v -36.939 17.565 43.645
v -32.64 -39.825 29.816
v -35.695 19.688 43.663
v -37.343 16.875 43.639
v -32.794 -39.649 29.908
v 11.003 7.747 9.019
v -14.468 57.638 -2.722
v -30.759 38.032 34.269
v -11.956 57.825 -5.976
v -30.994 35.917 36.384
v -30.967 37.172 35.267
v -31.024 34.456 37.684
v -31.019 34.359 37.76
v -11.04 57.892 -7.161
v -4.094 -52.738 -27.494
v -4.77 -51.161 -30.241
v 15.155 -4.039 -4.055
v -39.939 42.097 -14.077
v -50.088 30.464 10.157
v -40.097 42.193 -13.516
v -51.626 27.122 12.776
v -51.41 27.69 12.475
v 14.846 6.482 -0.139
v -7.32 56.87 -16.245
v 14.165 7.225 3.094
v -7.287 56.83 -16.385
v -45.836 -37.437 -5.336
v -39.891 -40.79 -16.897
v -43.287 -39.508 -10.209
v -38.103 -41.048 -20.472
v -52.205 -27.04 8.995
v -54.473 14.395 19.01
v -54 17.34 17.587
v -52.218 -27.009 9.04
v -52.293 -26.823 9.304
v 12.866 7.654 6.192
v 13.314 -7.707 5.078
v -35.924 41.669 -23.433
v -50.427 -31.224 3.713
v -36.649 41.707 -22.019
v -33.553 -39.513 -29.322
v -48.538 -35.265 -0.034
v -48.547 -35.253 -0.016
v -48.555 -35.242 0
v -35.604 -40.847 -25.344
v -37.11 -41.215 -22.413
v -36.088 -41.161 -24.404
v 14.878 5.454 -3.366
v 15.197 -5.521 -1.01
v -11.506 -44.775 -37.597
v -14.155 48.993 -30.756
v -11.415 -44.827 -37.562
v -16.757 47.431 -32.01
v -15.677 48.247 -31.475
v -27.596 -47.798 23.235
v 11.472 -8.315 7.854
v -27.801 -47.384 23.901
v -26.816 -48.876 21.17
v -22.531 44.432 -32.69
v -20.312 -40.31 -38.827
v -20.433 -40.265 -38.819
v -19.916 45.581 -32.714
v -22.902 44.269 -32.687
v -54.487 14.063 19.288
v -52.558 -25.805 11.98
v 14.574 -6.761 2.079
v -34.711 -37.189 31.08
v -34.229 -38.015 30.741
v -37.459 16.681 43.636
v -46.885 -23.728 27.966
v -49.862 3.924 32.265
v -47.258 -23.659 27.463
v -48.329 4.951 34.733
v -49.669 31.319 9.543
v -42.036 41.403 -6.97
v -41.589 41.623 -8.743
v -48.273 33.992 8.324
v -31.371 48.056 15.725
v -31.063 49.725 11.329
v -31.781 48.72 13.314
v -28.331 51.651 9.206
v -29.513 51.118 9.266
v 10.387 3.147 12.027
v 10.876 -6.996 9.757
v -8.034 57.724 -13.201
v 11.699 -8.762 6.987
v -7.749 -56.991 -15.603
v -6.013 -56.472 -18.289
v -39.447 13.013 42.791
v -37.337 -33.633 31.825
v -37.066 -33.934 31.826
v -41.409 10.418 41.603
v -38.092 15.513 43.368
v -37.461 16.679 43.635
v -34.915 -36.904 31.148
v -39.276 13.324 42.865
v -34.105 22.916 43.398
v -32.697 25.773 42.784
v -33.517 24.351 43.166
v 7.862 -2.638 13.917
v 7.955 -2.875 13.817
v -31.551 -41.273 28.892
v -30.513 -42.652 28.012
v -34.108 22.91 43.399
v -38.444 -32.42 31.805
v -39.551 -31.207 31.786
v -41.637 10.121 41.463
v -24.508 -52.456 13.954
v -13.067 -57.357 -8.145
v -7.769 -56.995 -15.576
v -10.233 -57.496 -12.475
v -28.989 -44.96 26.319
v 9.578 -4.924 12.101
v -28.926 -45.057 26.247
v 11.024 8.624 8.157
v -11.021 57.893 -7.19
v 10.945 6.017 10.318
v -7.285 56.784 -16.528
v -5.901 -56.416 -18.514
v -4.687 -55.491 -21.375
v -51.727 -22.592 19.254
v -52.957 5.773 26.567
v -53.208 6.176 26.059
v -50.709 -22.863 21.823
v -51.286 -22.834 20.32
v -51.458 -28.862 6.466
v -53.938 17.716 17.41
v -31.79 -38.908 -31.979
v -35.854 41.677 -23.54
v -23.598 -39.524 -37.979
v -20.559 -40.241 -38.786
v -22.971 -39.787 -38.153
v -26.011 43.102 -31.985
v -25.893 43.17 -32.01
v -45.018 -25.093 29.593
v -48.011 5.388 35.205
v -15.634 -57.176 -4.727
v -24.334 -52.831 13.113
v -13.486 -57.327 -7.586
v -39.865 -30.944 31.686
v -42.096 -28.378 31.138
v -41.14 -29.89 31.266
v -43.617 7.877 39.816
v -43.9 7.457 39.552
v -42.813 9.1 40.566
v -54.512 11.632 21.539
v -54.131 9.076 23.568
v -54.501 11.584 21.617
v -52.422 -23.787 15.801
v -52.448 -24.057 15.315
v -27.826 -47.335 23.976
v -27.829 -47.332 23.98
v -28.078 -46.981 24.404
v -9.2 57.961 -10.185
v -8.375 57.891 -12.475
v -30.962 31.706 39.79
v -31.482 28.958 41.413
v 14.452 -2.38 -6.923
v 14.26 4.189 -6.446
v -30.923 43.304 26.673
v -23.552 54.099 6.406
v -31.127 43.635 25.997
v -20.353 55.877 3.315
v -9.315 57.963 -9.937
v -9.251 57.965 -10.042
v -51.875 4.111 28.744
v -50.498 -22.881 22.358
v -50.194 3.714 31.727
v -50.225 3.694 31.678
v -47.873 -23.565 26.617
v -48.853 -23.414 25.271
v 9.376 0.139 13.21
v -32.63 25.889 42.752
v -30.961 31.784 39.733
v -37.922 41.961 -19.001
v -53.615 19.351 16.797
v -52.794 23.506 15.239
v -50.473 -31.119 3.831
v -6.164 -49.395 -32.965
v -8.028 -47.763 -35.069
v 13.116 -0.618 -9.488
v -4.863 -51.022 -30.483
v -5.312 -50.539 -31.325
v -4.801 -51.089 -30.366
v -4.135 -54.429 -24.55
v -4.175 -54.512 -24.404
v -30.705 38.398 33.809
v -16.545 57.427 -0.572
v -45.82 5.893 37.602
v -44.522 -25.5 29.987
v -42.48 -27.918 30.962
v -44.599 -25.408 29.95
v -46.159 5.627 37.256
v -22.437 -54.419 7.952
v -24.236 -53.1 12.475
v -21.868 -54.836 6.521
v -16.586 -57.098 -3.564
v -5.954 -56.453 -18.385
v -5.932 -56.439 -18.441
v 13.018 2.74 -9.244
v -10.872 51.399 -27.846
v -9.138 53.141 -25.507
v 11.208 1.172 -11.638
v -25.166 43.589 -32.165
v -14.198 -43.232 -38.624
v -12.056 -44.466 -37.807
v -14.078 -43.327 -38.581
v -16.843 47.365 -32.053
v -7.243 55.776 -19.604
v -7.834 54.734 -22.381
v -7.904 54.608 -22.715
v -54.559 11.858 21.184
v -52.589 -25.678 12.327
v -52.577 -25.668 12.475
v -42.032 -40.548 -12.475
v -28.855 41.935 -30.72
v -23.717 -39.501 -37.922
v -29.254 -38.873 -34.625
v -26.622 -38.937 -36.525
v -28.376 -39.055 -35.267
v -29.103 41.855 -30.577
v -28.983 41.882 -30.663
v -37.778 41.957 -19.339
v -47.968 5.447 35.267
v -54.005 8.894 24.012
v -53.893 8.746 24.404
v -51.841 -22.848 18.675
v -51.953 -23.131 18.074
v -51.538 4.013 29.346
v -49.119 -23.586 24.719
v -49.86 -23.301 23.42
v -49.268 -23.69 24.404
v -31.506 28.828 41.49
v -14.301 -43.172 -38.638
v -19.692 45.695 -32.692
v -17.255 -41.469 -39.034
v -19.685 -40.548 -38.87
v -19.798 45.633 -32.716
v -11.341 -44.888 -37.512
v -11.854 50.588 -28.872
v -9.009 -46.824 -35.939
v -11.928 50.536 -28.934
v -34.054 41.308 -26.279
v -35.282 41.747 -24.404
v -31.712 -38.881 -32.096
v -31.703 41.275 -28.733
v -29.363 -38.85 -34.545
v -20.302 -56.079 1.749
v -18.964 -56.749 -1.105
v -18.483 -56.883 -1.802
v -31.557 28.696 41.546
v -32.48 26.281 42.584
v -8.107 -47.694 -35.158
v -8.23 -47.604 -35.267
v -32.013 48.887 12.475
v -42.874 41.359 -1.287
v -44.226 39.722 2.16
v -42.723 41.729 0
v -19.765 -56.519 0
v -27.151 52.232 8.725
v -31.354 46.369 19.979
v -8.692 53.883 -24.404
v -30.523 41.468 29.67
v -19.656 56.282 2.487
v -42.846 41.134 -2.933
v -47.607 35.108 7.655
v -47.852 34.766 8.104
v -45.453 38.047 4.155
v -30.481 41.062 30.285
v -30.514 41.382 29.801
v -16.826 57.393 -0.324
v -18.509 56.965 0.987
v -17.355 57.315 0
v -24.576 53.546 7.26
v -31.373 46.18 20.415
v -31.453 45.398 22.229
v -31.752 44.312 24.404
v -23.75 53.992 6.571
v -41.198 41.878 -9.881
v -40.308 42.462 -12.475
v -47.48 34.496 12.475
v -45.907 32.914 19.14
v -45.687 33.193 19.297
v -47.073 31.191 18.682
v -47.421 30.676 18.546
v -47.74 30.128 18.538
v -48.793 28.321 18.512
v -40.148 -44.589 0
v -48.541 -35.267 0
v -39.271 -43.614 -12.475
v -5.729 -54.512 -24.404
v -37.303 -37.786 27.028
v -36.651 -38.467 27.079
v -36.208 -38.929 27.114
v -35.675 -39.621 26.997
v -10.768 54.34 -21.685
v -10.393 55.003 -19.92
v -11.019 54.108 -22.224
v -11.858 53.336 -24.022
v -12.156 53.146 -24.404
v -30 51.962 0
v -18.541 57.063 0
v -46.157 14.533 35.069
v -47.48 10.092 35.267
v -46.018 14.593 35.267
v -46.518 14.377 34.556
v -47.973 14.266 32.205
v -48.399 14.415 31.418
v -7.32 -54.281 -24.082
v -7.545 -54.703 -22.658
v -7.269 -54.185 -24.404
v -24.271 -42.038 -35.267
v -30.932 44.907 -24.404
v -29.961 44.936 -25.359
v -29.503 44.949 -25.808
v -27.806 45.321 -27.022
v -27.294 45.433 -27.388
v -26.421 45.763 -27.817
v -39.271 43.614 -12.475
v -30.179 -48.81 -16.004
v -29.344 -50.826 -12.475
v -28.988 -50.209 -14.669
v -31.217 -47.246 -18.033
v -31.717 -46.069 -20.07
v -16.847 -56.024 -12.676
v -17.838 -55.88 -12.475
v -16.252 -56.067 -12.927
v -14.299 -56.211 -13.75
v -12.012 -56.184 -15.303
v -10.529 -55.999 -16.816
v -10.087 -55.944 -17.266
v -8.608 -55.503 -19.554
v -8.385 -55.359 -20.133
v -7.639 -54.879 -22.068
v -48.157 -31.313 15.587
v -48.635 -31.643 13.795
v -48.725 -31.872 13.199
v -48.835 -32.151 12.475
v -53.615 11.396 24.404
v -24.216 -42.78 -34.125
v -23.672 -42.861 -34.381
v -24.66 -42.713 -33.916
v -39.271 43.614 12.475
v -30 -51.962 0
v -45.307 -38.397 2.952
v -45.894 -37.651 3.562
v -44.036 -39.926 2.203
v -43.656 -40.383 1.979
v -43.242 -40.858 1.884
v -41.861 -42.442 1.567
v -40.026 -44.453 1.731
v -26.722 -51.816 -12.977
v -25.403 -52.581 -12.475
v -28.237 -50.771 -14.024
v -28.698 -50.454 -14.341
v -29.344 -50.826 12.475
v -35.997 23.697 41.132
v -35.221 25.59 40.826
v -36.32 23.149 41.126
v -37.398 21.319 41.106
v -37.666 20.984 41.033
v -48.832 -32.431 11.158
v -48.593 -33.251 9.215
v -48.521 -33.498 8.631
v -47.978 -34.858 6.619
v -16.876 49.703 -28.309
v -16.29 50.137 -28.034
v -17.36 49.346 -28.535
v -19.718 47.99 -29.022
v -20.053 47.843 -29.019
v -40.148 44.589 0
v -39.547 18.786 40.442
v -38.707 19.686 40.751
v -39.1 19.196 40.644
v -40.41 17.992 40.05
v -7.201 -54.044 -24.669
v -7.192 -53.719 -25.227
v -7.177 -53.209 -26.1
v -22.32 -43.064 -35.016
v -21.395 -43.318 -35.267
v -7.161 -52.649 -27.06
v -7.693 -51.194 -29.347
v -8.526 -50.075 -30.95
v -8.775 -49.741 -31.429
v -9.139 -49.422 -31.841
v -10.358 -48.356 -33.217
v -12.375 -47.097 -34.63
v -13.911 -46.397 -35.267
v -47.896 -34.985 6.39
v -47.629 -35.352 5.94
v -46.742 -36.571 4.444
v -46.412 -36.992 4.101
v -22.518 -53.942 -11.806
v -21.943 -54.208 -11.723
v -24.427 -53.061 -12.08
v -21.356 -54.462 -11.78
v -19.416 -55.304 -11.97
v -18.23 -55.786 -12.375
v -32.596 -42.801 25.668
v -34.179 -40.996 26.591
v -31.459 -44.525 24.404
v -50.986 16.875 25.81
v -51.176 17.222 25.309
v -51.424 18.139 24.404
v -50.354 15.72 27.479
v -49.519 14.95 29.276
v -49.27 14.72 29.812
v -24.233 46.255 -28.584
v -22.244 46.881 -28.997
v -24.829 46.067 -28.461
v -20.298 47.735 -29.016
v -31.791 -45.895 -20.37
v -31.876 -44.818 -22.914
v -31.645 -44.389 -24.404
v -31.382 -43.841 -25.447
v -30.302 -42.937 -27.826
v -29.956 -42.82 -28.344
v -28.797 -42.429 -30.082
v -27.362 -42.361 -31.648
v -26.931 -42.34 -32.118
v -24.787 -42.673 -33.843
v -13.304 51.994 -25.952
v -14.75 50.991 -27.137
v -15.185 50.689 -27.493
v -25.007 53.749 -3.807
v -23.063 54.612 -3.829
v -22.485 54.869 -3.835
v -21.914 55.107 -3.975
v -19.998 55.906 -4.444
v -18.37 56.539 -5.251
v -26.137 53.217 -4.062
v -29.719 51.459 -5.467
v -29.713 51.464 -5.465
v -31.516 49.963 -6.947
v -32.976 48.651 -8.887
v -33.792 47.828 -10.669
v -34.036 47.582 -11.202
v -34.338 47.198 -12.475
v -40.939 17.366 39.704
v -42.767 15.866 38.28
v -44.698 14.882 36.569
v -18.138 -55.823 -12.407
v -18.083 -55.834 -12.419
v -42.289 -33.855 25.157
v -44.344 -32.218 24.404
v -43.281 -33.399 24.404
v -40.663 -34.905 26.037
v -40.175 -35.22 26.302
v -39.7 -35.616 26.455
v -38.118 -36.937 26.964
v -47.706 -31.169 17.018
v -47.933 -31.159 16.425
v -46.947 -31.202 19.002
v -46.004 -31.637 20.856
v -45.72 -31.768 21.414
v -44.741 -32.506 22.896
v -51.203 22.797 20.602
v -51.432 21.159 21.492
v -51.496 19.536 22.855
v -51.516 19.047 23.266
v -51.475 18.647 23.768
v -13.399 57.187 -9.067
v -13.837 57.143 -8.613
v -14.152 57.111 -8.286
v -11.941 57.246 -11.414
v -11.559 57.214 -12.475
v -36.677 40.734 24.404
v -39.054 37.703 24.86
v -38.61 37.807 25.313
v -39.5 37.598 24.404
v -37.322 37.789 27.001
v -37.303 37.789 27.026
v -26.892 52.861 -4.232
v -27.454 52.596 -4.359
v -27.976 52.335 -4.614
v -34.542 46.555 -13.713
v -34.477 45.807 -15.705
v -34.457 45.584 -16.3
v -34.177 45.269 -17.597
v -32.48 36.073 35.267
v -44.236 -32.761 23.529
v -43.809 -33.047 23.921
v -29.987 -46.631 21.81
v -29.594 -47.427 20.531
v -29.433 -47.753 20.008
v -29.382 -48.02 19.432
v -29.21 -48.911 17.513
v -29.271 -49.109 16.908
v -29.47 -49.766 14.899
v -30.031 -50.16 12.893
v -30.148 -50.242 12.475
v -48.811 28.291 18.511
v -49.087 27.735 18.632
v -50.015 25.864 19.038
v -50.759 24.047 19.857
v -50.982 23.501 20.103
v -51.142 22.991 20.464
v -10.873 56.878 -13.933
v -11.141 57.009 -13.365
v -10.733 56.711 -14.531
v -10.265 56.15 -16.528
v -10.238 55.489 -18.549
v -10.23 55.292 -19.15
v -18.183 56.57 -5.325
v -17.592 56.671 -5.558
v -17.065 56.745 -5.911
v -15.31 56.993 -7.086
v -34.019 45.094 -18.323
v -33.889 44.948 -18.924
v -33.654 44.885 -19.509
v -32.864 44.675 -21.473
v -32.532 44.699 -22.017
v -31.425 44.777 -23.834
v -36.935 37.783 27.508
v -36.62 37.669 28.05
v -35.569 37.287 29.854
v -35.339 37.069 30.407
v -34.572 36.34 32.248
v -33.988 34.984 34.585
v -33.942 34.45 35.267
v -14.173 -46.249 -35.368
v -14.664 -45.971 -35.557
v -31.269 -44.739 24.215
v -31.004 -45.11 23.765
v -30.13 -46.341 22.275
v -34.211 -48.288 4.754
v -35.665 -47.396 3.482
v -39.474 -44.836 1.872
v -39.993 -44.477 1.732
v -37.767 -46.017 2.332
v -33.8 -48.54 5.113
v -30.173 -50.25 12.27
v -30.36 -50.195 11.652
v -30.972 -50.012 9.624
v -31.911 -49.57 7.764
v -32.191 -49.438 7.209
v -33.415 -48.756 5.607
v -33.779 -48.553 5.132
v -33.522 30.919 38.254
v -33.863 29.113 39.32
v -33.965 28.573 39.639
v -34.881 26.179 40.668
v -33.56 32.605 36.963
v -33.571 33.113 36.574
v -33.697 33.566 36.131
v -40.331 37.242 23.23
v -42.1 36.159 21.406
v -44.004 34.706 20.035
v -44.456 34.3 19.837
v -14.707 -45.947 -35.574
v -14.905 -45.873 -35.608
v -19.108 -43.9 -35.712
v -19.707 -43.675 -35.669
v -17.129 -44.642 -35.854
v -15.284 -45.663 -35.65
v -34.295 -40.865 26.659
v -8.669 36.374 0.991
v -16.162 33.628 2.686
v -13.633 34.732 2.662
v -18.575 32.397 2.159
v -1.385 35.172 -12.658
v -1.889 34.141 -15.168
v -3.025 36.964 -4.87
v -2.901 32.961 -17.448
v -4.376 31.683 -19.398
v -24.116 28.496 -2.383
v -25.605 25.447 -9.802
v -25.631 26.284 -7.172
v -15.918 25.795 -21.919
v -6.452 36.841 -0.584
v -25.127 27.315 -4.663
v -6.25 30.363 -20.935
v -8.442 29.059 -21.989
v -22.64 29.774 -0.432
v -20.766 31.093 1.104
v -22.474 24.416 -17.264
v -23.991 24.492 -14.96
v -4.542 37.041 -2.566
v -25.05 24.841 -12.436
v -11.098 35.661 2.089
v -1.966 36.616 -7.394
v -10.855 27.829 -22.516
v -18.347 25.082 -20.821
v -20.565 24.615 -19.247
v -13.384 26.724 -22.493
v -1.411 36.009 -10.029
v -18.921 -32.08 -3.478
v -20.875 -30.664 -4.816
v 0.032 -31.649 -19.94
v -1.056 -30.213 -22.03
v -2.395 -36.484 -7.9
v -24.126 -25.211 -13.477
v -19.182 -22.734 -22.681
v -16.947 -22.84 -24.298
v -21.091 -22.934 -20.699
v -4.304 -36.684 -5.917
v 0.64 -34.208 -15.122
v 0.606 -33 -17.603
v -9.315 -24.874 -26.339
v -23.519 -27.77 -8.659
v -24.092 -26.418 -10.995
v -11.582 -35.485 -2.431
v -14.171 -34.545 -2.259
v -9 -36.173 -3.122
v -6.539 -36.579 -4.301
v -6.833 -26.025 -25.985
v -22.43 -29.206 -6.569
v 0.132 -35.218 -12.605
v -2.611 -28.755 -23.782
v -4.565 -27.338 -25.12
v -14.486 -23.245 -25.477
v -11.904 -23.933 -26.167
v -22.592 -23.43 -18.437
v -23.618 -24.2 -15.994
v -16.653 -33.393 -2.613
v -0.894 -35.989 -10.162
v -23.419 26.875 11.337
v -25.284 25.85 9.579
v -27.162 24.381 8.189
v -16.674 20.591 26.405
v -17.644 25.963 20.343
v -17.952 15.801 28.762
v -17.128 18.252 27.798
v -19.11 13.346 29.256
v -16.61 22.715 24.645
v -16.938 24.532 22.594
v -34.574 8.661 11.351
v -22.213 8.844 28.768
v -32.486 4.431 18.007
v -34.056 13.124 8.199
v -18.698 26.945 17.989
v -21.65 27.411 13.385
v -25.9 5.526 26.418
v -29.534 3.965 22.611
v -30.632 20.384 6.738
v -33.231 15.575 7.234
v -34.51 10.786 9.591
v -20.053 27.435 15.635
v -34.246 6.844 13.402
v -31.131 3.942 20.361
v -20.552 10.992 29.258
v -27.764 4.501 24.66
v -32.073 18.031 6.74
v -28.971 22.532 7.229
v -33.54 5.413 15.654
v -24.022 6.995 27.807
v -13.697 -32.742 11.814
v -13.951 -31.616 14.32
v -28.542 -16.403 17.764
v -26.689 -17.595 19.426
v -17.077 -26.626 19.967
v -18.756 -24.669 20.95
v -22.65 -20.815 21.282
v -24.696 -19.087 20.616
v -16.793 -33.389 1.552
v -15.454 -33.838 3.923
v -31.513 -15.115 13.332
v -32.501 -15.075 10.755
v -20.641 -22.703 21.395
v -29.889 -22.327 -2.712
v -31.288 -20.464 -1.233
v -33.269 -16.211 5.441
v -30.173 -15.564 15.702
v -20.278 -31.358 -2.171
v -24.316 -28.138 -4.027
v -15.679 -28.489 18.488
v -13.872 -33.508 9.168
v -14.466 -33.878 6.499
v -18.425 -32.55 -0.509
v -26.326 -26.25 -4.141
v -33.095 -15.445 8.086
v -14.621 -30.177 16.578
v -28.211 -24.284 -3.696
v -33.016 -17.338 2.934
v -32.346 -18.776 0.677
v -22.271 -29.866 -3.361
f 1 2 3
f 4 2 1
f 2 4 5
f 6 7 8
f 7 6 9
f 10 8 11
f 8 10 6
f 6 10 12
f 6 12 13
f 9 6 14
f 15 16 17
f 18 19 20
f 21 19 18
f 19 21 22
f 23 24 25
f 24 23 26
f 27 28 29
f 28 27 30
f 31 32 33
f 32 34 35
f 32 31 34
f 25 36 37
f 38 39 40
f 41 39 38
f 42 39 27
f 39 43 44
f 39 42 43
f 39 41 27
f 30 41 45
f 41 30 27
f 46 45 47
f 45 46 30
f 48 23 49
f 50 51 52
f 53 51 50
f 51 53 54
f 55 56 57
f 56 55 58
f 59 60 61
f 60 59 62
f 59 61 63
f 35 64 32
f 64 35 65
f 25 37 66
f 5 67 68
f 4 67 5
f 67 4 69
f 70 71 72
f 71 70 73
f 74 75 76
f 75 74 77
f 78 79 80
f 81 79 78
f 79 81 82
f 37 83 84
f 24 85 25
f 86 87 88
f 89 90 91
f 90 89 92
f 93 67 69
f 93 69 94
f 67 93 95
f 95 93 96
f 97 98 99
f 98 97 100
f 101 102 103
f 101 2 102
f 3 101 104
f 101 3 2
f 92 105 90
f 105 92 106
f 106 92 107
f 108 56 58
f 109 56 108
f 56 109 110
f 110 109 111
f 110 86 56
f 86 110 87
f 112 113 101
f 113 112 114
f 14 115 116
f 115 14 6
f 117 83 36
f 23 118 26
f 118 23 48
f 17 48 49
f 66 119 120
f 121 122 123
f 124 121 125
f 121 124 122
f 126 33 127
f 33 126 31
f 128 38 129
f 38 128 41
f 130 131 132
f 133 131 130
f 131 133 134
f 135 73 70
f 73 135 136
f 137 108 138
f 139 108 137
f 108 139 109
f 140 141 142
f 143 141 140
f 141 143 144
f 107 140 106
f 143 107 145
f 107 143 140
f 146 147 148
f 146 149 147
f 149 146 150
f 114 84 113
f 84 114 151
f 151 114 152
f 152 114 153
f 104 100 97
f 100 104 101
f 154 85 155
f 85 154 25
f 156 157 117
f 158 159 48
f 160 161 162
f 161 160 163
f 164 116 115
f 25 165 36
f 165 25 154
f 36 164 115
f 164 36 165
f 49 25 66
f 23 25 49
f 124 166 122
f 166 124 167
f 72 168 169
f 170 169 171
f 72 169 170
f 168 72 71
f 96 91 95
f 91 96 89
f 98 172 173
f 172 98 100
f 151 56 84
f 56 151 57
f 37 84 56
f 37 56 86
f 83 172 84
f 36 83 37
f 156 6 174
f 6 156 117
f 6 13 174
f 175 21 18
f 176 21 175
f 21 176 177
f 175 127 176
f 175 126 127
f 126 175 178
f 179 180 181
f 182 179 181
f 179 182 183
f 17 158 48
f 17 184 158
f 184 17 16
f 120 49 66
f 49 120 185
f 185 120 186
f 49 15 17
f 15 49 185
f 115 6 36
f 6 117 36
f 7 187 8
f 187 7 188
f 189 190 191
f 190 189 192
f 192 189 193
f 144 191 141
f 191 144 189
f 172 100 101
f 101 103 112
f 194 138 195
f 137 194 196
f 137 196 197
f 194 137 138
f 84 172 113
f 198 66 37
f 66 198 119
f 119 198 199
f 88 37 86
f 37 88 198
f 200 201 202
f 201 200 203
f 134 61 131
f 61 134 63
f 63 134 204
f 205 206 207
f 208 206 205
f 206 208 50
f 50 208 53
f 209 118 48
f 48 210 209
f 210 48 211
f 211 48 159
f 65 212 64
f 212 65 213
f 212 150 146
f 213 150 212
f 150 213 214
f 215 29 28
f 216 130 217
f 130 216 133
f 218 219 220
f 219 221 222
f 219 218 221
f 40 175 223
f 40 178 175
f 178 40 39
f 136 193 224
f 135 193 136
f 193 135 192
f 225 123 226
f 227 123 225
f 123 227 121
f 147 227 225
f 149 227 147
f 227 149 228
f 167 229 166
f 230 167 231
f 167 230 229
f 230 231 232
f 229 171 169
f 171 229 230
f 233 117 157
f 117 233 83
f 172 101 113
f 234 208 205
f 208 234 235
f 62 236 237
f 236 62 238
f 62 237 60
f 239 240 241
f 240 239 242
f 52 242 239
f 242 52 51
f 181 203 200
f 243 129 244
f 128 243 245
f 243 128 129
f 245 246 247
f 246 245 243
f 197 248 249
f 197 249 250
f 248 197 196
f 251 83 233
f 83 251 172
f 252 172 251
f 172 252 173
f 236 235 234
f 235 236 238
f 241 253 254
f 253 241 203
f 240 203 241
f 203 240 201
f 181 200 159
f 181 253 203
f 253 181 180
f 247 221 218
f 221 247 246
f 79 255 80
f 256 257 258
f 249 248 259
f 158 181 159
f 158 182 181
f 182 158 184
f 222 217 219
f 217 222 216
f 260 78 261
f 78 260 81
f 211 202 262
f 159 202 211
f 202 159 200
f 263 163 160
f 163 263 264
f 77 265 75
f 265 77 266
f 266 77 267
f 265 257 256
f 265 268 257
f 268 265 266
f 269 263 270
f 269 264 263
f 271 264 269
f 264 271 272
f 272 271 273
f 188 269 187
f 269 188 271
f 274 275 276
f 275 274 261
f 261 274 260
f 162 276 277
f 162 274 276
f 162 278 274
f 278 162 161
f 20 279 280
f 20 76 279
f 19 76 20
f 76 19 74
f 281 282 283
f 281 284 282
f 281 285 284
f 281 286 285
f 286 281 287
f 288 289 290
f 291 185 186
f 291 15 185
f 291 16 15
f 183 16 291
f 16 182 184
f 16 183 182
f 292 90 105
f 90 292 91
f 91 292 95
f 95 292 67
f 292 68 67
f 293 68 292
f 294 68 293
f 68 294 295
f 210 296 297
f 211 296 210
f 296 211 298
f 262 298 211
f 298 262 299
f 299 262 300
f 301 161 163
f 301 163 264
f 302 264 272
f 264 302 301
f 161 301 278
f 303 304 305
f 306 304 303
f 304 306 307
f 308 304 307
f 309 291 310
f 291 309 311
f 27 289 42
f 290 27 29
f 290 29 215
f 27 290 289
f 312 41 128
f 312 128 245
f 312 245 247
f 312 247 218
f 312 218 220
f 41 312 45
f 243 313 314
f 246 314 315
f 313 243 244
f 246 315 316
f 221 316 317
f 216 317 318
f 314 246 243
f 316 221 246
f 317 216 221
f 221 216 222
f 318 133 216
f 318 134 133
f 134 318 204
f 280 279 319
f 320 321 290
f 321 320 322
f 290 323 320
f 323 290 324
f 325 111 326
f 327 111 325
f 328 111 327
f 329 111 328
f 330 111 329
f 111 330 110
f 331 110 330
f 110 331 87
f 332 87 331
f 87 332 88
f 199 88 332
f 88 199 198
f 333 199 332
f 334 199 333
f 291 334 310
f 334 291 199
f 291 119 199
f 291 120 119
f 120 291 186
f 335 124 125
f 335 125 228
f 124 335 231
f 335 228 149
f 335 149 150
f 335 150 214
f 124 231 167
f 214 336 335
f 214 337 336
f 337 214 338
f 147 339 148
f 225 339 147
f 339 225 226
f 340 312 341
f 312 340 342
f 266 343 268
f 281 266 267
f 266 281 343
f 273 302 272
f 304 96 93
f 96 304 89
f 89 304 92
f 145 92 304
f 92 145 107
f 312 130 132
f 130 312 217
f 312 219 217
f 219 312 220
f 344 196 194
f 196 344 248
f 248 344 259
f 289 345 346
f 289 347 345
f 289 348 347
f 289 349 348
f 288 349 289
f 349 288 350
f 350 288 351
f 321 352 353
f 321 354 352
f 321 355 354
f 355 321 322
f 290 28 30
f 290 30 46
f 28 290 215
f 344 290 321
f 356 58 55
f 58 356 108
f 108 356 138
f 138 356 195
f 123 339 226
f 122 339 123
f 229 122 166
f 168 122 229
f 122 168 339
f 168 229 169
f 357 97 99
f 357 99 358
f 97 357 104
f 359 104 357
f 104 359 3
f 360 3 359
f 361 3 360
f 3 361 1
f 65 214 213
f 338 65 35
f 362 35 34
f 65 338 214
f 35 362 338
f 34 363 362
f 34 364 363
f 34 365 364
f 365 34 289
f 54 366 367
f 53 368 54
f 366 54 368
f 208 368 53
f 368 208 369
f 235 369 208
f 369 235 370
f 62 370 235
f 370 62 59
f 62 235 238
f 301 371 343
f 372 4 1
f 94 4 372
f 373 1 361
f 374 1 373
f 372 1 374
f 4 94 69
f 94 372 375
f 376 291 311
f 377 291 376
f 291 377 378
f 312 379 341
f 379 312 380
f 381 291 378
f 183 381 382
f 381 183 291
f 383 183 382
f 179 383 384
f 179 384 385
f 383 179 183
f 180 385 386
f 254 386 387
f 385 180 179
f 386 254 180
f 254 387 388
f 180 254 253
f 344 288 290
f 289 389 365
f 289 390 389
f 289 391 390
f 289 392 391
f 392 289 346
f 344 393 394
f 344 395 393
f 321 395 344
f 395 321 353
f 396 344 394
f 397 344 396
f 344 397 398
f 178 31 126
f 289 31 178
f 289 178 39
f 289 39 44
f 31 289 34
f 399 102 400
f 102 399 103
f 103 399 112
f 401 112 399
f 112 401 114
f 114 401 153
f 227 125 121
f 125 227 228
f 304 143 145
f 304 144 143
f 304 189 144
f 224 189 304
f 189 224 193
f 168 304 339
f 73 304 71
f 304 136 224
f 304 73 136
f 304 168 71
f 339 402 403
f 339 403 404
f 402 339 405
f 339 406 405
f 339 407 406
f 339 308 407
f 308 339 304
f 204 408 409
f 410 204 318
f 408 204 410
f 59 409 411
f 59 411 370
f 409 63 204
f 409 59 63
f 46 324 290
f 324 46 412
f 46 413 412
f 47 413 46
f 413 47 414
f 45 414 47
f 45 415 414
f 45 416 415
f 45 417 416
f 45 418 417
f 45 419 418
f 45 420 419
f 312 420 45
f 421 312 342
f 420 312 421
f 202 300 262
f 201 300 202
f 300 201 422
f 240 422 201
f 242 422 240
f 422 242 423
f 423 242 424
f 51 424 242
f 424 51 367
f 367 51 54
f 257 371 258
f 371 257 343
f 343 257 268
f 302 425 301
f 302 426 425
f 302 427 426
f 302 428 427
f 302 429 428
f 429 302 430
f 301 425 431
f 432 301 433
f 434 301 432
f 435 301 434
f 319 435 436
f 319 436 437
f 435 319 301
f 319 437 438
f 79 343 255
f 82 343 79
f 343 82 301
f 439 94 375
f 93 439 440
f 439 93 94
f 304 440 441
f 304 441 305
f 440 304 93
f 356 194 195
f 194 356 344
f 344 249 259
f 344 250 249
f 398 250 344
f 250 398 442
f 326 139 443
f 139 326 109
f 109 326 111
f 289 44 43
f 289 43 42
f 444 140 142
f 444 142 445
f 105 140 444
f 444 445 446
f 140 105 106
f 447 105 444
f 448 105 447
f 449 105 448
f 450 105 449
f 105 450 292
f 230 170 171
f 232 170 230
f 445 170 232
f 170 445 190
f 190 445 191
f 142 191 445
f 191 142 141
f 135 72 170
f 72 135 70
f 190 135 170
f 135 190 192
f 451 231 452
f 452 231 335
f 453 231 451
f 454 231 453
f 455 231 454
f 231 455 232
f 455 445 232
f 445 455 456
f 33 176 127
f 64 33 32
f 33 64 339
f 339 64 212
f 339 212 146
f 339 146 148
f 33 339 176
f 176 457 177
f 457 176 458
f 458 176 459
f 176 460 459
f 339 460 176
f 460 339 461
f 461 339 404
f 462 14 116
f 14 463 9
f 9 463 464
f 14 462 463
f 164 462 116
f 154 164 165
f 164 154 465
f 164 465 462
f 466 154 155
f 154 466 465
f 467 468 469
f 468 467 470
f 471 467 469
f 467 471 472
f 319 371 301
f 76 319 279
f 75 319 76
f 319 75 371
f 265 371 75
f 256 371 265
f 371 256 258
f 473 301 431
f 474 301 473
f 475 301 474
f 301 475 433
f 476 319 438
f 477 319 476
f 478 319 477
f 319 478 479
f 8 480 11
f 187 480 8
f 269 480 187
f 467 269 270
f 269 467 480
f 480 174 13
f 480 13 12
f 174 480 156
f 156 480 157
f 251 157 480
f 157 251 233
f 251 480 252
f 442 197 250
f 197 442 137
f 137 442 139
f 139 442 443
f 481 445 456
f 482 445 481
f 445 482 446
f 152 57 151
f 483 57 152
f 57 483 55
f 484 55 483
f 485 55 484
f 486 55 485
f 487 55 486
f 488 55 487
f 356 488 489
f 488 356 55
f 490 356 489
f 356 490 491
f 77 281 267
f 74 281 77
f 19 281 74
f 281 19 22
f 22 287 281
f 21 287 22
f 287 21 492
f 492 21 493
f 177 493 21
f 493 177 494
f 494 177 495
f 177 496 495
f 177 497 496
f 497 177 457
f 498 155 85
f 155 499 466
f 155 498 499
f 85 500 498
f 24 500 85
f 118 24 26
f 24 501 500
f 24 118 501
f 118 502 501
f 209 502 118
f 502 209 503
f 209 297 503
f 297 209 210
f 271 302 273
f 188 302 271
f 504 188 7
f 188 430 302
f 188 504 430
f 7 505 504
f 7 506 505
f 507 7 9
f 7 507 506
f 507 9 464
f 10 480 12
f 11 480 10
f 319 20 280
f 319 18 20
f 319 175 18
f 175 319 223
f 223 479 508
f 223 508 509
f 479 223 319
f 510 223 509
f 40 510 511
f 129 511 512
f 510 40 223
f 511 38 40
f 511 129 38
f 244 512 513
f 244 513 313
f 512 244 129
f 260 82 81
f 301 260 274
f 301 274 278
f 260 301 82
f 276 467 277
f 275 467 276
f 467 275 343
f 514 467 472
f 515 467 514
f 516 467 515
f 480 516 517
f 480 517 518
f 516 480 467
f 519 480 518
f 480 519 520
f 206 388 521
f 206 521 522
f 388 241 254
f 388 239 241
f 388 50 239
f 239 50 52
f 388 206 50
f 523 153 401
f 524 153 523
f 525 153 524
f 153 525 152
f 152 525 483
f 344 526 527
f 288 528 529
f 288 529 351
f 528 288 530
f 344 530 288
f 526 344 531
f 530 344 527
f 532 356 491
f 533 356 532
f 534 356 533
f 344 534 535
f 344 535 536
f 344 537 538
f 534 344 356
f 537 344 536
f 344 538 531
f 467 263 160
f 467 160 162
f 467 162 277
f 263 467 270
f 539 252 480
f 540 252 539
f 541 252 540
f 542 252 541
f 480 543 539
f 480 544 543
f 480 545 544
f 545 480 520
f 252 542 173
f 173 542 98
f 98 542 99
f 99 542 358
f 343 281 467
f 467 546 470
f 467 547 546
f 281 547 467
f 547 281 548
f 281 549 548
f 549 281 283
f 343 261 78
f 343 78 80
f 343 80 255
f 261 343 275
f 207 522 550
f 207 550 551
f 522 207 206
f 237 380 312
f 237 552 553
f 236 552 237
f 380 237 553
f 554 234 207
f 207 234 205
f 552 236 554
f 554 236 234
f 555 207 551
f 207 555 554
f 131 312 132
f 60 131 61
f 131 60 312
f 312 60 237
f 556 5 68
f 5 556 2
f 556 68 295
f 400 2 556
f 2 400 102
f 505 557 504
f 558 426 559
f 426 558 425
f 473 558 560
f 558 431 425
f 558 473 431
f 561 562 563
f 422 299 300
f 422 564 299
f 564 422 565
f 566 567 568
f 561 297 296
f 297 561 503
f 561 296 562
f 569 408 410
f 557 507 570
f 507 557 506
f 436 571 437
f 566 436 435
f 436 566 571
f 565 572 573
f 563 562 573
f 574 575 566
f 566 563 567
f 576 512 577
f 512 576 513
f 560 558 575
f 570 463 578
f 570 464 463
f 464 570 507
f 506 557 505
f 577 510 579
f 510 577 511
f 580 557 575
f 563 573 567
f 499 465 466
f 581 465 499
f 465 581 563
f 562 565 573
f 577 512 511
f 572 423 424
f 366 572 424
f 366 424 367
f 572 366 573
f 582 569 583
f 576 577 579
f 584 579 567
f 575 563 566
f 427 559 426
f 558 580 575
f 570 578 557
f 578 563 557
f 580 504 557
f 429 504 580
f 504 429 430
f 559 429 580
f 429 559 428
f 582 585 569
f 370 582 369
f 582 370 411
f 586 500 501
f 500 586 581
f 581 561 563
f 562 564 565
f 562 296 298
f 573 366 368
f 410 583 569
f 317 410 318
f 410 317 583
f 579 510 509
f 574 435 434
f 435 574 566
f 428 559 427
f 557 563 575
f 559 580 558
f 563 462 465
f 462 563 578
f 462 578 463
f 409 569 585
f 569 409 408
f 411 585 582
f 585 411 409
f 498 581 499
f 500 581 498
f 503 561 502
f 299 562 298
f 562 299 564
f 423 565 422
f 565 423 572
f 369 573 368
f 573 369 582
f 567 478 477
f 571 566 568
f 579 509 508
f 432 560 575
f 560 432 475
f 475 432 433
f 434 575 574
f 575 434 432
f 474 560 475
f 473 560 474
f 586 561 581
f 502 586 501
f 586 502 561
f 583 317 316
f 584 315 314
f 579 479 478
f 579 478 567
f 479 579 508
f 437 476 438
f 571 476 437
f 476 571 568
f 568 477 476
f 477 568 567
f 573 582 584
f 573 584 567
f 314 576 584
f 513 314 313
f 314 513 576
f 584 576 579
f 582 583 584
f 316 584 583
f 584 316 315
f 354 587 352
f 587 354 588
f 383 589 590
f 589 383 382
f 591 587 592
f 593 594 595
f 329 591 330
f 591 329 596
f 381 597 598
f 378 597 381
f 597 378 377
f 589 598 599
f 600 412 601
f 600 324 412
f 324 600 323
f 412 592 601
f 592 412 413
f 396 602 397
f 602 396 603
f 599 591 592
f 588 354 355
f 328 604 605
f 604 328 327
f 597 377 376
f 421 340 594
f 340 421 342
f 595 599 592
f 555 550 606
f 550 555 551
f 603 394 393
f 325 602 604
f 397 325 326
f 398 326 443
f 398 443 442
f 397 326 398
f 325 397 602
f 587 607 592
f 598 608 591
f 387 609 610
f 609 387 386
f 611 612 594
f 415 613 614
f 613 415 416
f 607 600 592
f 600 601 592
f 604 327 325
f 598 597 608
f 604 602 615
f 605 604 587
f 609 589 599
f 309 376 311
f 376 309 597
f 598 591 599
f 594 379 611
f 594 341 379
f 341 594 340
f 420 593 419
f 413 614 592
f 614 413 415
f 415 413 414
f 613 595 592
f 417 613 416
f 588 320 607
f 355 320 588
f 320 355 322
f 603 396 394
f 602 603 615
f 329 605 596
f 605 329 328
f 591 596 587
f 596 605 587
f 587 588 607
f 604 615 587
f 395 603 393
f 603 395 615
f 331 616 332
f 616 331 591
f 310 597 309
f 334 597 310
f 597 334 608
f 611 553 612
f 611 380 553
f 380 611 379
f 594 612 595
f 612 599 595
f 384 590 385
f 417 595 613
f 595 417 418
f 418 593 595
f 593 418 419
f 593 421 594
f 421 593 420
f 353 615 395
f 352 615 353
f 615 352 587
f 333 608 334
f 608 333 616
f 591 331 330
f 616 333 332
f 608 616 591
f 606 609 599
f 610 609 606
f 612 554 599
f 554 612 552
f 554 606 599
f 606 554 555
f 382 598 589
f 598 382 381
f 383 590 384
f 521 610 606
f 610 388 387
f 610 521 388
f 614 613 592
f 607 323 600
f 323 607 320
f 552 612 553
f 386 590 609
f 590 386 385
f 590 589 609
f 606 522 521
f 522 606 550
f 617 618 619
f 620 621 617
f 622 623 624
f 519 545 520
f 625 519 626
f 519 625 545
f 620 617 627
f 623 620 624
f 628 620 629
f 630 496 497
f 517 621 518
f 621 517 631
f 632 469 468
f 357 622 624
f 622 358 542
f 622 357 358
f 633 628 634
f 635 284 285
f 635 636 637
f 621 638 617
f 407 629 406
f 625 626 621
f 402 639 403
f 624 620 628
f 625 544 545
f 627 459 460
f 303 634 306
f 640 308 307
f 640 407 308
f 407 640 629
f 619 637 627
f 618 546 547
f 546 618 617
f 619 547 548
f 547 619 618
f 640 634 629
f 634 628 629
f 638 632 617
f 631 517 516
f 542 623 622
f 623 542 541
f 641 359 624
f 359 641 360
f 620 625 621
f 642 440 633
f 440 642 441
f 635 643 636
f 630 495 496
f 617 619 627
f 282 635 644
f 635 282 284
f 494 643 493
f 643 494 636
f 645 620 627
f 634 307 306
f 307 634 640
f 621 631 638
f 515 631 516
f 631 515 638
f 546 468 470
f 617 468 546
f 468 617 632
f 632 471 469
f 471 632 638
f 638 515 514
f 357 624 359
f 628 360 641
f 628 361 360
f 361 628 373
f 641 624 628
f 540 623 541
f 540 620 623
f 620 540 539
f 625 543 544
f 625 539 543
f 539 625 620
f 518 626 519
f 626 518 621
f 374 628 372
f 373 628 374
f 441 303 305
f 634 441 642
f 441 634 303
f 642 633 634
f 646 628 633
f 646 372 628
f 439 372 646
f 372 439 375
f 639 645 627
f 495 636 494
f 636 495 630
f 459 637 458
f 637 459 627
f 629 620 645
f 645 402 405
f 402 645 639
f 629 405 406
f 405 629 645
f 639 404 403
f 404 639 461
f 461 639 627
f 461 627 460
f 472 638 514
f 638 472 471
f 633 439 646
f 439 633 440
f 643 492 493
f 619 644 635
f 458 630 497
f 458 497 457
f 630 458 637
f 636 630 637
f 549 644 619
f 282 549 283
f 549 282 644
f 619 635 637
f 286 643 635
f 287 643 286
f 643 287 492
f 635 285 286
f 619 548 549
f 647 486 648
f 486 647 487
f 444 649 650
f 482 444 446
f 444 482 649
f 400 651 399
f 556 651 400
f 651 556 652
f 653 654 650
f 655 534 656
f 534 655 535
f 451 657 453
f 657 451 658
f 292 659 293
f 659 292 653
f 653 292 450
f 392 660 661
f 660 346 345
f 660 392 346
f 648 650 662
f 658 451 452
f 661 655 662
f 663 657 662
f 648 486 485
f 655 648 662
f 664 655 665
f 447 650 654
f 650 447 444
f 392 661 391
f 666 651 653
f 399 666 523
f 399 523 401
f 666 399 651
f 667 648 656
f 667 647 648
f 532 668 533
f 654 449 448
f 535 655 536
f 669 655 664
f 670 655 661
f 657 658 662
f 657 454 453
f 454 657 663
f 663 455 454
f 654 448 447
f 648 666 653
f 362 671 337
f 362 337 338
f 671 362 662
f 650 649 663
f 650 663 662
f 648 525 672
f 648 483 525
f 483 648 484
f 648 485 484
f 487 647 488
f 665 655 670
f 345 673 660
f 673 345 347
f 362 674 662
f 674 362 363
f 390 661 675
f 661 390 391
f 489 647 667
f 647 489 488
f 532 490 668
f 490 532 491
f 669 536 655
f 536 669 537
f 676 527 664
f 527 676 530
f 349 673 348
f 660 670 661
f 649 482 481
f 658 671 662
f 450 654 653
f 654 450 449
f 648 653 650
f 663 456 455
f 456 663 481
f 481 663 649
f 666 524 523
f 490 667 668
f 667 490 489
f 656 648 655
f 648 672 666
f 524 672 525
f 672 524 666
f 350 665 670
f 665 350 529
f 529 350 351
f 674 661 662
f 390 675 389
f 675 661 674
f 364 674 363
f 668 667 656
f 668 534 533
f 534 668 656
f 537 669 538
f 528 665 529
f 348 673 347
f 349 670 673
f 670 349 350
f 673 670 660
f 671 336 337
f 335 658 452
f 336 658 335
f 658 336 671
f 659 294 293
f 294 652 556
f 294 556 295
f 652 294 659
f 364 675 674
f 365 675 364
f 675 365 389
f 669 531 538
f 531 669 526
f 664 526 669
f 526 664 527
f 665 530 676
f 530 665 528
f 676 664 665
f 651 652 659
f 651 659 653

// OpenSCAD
difference() {
	intersection() {
		hull() {
			rotate(a = -44.0760747966, v = [-0.0723183475, 0.6918434180, 0.0000000000]) {
				rotate(a = -90.0000000000, v = [0.8660254038, 0.5000000000, -0.0000000000]) {
					cylinder(h = 60, r = 16.2000000000);
				}
			}
			rotate(a = -44.0760747966, v = [-0.0723183475, 0.6918434180, 0.0000000000]) {
				rotate(a = -90.0000000000, v = [-0.8660254038, 0.5000000000, 0.0000000000]) {
					cylinder(h = 60, r = 16.2000000000);
				}
			}
			rotate(a = -44.0760747966, v = [-0.0723183475, 0.6918434180, 0.0000000000]) {
				rotate(a = -32.5529951665, v = [0.5053465272, 0.1848090856, -0.0000000000]) {
					cylinder(h = 60, r = 16.2000000000);
				}
			}
			rotate(a = -44.0760747966, v = [-0.0723183475, 0.6918434180, 0.0000000000]) {
				rotate(a = -46.2229214243, v = [-0.6598396710, 0.2931708240, 0.0000000000]) {
					cylinder(h = 60, r = 16.2000000000);
				}
			}
		}
		sphere(r = 60);
	}
	union() {
		rotate(a = -44.0760747966, v = [-0.0723183475, 0.6918434180, 0.0000000000]) {
			rotate(a = -90.0000000000, v = [0.8660254038, 0.5000000000, -0.0000000000]) {
				translate(v = [0, 0, 35]) {
					cylinder(h = 100, r = 13.2000000000);
				}
			}
		}
		rotate(a = -44.0760747966, v = [-0.0723183475, 0.6918434180, 0.0000000000]) {
			rotate(a = -90.0000000000, v = [-0.8660254038, 0.5000000000, 0.0000000000]) {
				translate(v = [0, 0, 35]) {
					cylinder(h = 100, r = 13.2000000000);
				}
			}
		}
		rotate(a = -44.0760747966, v = [-0.0723183475, 0.6918434180, 0.0000000000]) {
			rotate(a = -32.5529951665, v = [0.5053465272, 0.1848090856, -0.0000000000]) {
				translate(v = [0, 0, 35]) {
					cylinder(h = 100, r = 13.2000000000);
				}
			}
		}
		rotate(a = -44.0760747966, v = [-0.0723183475, 0.6918434180, 0.0000000000]) {
			rotate(a = -46.2229214243, v = [-0.6598396710, 0.2931708240, 0.0000000000]) {
				translate(v = [0, 0, 35]) {
					cylinder(h = 100, r = 13.2000000000);
				}
			}
		}
	}
}
